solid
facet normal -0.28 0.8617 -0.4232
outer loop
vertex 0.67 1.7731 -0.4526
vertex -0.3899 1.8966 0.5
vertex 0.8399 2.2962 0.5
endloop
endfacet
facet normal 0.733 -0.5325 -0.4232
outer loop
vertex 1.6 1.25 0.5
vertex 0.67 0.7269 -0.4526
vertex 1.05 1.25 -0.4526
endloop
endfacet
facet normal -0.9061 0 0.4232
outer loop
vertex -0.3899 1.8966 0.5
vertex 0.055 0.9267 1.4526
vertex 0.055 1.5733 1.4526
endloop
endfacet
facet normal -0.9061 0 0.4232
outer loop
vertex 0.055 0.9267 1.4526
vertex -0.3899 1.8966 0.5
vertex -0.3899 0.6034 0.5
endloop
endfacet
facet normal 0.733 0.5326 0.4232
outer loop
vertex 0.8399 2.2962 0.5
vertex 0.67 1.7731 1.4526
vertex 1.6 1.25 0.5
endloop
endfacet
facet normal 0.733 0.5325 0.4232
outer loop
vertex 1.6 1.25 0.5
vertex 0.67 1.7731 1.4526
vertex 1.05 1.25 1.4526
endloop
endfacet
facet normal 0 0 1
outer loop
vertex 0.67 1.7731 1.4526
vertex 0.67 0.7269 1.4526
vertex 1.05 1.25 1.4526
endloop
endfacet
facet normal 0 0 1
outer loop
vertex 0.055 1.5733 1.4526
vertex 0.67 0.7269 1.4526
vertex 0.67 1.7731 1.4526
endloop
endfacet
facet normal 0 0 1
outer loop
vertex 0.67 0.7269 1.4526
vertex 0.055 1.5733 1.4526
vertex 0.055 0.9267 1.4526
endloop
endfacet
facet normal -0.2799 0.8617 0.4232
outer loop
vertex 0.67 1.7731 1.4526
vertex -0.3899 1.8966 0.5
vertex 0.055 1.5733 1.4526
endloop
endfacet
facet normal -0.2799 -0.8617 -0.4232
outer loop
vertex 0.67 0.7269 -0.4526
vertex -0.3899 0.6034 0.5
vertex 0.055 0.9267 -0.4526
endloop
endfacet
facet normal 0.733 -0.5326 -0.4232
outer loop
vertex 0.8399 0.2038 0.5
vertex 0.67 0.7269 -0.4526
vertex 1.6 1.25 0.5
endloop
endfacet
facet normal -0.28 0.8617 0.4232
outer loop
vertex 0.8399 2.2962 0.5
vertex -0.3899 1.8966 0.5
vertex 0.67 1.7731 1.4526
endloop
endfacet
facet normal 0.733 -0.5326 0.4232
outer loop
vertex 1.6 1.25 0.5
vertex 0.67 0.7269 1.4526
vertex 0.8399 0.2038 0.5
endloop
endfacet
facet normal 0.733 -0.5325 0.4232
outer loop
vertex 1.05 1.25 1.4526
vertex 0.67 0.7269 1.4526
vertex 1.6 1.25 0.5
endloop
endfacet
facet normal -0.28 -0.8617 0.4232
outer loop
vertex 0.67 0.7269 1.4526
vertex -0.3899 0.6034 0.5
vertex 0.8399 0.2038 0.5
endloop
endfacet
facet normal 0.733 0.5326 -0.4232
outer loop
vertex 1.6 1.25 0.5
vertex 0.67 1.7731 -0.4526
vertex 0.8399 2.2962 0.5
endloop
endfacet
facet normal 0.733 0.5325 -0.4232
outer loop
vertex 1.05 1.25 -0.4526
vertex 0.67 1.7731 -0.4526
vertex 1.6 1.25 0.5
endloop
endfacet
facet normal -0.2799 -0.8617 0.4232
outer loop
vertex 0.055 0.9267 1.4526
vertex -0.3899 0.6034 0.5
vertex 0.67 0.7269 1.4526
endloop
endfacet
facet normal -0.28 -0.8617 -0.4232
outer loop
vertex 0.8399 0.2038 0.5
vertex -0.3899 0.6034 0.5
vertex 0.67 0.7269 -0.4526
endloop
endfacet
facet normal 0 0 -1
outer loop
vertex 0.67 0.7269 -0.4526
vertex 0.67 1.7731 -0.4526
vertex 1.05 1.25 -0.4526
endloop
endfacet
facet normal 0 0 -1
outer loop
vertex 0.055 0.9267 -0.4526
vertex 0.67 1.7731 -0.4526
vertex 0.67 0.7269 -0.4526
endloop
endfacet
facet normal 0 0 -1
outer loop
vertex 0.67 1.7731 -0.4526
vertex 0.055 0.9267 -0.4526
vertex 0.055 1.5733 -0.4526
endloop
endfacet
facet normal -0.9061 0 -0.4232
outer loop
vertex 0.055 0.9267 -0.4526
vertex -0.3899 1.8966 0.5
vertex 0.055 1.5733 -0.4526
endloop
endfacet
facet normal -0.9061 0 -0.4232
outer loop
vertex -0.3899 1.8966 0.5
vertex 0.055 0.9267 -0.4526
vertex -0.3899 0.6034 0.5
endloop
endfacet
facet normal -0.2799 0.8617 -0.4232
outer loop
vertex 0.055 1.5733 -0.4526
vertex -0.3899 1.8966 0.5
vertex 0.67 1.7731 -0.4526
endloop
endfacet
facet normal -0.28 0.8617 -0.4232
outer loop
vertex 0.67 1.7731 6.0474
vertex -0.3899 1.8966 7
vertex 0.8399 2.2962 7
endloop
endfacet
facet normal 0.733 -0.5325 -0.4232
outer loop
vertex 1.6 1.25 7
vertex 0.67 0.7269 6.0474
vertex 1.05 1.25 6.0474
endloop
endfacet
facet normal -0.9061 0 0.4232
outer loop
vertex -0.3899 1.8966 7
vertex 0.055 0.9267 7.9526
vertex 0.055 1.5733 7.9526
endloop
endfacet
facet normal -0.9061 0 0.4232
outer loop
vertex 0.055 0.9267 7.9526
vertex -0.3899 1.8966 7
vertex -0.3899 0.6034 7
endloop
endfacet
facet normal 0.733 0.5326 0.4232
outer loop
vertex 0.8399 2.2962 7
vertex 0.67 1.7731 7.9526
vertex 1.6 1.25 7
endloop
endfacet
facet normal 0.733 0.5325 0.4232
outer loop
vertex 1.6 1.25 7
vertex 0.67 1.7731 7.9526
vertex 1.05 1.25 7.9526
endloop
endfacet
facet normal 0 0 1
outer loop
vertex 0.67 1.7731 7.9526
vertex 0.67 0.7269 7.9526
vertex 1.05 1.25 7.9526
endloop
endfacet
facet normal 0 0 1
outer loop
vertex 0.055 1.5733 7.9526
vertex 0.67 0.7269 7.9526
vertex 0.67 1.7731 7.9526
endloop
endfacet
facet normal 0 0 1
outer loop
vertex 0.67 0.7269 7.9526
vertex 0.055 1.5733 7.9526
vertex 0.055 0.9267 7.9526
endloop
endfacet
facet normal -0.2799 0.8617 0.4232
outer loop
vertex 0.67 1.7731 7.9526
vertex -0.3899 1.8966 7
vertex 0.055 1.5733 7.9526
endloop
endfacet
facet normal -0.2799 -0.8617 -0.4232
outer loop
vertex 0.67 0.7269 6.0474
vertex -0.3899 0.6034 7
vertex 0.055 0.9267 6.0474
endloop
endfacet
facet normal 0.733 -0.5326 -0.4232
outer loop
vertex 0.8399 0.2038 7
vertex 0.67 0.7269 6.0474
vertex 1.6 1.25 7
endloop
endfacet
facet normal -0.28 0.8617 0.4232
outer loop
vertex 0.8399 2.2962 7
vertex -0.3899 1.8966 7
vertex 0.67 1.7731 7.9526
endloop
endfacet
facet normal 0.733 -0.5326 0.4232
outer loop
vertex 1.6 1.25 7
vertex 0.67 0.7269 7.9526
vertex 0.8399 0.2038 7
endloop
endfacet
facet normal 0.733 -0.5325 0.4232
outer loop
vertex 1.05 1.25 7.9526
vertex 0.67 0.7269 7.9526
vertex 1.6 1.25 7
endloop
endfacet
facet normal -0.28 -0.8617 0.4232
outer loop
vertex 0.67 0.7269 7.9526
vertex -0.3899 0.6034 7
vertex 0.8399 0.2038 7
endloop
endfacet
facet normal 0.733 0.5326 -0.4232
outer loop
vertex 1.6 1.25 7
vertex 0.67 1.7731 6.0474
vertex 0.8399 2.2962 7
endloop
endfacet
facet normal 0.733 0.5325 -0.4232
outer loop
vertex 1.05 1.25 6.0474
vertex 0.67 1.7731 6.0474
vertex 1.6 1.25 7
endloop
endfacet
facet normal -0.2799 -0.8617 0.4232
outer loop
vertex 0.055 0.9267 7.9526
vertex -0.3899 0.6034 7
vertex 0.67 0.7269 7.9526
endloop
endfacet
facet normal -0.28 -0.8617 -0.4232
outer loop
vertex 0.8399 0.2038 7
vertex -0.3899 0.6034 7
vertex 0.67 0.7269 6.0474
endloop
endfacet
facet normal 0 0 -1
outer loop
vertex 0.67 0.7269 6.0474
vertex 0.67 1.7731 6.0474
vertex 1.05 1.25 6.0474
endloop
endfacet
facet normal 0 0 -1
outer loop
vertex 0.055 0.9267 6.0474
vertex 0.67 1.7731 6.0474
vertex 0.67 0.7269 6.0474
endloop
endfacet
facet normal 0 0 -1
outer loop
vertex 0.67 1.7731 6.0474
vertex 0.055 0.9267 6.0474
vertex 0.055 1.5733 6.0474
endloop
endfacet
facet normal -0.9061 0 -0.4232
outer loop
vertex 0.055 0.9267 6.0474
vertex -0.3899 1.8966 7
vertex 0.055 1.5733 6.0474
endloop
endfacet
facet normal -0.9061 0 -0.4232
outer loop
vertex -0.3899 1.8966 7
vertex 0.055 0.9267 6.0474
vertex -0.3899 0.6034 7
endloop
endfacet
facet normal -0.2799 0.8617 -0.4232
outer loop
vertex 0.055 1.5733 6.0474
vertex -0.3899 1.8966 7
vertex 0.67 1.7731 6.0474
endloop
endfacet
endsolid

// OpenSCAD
union() {
  translate([0.5, 1.25, 0.5]) sphere(r=1.1);
  translate([0.5, 1.25, 7.0]) sphere(r=1.1);
}
